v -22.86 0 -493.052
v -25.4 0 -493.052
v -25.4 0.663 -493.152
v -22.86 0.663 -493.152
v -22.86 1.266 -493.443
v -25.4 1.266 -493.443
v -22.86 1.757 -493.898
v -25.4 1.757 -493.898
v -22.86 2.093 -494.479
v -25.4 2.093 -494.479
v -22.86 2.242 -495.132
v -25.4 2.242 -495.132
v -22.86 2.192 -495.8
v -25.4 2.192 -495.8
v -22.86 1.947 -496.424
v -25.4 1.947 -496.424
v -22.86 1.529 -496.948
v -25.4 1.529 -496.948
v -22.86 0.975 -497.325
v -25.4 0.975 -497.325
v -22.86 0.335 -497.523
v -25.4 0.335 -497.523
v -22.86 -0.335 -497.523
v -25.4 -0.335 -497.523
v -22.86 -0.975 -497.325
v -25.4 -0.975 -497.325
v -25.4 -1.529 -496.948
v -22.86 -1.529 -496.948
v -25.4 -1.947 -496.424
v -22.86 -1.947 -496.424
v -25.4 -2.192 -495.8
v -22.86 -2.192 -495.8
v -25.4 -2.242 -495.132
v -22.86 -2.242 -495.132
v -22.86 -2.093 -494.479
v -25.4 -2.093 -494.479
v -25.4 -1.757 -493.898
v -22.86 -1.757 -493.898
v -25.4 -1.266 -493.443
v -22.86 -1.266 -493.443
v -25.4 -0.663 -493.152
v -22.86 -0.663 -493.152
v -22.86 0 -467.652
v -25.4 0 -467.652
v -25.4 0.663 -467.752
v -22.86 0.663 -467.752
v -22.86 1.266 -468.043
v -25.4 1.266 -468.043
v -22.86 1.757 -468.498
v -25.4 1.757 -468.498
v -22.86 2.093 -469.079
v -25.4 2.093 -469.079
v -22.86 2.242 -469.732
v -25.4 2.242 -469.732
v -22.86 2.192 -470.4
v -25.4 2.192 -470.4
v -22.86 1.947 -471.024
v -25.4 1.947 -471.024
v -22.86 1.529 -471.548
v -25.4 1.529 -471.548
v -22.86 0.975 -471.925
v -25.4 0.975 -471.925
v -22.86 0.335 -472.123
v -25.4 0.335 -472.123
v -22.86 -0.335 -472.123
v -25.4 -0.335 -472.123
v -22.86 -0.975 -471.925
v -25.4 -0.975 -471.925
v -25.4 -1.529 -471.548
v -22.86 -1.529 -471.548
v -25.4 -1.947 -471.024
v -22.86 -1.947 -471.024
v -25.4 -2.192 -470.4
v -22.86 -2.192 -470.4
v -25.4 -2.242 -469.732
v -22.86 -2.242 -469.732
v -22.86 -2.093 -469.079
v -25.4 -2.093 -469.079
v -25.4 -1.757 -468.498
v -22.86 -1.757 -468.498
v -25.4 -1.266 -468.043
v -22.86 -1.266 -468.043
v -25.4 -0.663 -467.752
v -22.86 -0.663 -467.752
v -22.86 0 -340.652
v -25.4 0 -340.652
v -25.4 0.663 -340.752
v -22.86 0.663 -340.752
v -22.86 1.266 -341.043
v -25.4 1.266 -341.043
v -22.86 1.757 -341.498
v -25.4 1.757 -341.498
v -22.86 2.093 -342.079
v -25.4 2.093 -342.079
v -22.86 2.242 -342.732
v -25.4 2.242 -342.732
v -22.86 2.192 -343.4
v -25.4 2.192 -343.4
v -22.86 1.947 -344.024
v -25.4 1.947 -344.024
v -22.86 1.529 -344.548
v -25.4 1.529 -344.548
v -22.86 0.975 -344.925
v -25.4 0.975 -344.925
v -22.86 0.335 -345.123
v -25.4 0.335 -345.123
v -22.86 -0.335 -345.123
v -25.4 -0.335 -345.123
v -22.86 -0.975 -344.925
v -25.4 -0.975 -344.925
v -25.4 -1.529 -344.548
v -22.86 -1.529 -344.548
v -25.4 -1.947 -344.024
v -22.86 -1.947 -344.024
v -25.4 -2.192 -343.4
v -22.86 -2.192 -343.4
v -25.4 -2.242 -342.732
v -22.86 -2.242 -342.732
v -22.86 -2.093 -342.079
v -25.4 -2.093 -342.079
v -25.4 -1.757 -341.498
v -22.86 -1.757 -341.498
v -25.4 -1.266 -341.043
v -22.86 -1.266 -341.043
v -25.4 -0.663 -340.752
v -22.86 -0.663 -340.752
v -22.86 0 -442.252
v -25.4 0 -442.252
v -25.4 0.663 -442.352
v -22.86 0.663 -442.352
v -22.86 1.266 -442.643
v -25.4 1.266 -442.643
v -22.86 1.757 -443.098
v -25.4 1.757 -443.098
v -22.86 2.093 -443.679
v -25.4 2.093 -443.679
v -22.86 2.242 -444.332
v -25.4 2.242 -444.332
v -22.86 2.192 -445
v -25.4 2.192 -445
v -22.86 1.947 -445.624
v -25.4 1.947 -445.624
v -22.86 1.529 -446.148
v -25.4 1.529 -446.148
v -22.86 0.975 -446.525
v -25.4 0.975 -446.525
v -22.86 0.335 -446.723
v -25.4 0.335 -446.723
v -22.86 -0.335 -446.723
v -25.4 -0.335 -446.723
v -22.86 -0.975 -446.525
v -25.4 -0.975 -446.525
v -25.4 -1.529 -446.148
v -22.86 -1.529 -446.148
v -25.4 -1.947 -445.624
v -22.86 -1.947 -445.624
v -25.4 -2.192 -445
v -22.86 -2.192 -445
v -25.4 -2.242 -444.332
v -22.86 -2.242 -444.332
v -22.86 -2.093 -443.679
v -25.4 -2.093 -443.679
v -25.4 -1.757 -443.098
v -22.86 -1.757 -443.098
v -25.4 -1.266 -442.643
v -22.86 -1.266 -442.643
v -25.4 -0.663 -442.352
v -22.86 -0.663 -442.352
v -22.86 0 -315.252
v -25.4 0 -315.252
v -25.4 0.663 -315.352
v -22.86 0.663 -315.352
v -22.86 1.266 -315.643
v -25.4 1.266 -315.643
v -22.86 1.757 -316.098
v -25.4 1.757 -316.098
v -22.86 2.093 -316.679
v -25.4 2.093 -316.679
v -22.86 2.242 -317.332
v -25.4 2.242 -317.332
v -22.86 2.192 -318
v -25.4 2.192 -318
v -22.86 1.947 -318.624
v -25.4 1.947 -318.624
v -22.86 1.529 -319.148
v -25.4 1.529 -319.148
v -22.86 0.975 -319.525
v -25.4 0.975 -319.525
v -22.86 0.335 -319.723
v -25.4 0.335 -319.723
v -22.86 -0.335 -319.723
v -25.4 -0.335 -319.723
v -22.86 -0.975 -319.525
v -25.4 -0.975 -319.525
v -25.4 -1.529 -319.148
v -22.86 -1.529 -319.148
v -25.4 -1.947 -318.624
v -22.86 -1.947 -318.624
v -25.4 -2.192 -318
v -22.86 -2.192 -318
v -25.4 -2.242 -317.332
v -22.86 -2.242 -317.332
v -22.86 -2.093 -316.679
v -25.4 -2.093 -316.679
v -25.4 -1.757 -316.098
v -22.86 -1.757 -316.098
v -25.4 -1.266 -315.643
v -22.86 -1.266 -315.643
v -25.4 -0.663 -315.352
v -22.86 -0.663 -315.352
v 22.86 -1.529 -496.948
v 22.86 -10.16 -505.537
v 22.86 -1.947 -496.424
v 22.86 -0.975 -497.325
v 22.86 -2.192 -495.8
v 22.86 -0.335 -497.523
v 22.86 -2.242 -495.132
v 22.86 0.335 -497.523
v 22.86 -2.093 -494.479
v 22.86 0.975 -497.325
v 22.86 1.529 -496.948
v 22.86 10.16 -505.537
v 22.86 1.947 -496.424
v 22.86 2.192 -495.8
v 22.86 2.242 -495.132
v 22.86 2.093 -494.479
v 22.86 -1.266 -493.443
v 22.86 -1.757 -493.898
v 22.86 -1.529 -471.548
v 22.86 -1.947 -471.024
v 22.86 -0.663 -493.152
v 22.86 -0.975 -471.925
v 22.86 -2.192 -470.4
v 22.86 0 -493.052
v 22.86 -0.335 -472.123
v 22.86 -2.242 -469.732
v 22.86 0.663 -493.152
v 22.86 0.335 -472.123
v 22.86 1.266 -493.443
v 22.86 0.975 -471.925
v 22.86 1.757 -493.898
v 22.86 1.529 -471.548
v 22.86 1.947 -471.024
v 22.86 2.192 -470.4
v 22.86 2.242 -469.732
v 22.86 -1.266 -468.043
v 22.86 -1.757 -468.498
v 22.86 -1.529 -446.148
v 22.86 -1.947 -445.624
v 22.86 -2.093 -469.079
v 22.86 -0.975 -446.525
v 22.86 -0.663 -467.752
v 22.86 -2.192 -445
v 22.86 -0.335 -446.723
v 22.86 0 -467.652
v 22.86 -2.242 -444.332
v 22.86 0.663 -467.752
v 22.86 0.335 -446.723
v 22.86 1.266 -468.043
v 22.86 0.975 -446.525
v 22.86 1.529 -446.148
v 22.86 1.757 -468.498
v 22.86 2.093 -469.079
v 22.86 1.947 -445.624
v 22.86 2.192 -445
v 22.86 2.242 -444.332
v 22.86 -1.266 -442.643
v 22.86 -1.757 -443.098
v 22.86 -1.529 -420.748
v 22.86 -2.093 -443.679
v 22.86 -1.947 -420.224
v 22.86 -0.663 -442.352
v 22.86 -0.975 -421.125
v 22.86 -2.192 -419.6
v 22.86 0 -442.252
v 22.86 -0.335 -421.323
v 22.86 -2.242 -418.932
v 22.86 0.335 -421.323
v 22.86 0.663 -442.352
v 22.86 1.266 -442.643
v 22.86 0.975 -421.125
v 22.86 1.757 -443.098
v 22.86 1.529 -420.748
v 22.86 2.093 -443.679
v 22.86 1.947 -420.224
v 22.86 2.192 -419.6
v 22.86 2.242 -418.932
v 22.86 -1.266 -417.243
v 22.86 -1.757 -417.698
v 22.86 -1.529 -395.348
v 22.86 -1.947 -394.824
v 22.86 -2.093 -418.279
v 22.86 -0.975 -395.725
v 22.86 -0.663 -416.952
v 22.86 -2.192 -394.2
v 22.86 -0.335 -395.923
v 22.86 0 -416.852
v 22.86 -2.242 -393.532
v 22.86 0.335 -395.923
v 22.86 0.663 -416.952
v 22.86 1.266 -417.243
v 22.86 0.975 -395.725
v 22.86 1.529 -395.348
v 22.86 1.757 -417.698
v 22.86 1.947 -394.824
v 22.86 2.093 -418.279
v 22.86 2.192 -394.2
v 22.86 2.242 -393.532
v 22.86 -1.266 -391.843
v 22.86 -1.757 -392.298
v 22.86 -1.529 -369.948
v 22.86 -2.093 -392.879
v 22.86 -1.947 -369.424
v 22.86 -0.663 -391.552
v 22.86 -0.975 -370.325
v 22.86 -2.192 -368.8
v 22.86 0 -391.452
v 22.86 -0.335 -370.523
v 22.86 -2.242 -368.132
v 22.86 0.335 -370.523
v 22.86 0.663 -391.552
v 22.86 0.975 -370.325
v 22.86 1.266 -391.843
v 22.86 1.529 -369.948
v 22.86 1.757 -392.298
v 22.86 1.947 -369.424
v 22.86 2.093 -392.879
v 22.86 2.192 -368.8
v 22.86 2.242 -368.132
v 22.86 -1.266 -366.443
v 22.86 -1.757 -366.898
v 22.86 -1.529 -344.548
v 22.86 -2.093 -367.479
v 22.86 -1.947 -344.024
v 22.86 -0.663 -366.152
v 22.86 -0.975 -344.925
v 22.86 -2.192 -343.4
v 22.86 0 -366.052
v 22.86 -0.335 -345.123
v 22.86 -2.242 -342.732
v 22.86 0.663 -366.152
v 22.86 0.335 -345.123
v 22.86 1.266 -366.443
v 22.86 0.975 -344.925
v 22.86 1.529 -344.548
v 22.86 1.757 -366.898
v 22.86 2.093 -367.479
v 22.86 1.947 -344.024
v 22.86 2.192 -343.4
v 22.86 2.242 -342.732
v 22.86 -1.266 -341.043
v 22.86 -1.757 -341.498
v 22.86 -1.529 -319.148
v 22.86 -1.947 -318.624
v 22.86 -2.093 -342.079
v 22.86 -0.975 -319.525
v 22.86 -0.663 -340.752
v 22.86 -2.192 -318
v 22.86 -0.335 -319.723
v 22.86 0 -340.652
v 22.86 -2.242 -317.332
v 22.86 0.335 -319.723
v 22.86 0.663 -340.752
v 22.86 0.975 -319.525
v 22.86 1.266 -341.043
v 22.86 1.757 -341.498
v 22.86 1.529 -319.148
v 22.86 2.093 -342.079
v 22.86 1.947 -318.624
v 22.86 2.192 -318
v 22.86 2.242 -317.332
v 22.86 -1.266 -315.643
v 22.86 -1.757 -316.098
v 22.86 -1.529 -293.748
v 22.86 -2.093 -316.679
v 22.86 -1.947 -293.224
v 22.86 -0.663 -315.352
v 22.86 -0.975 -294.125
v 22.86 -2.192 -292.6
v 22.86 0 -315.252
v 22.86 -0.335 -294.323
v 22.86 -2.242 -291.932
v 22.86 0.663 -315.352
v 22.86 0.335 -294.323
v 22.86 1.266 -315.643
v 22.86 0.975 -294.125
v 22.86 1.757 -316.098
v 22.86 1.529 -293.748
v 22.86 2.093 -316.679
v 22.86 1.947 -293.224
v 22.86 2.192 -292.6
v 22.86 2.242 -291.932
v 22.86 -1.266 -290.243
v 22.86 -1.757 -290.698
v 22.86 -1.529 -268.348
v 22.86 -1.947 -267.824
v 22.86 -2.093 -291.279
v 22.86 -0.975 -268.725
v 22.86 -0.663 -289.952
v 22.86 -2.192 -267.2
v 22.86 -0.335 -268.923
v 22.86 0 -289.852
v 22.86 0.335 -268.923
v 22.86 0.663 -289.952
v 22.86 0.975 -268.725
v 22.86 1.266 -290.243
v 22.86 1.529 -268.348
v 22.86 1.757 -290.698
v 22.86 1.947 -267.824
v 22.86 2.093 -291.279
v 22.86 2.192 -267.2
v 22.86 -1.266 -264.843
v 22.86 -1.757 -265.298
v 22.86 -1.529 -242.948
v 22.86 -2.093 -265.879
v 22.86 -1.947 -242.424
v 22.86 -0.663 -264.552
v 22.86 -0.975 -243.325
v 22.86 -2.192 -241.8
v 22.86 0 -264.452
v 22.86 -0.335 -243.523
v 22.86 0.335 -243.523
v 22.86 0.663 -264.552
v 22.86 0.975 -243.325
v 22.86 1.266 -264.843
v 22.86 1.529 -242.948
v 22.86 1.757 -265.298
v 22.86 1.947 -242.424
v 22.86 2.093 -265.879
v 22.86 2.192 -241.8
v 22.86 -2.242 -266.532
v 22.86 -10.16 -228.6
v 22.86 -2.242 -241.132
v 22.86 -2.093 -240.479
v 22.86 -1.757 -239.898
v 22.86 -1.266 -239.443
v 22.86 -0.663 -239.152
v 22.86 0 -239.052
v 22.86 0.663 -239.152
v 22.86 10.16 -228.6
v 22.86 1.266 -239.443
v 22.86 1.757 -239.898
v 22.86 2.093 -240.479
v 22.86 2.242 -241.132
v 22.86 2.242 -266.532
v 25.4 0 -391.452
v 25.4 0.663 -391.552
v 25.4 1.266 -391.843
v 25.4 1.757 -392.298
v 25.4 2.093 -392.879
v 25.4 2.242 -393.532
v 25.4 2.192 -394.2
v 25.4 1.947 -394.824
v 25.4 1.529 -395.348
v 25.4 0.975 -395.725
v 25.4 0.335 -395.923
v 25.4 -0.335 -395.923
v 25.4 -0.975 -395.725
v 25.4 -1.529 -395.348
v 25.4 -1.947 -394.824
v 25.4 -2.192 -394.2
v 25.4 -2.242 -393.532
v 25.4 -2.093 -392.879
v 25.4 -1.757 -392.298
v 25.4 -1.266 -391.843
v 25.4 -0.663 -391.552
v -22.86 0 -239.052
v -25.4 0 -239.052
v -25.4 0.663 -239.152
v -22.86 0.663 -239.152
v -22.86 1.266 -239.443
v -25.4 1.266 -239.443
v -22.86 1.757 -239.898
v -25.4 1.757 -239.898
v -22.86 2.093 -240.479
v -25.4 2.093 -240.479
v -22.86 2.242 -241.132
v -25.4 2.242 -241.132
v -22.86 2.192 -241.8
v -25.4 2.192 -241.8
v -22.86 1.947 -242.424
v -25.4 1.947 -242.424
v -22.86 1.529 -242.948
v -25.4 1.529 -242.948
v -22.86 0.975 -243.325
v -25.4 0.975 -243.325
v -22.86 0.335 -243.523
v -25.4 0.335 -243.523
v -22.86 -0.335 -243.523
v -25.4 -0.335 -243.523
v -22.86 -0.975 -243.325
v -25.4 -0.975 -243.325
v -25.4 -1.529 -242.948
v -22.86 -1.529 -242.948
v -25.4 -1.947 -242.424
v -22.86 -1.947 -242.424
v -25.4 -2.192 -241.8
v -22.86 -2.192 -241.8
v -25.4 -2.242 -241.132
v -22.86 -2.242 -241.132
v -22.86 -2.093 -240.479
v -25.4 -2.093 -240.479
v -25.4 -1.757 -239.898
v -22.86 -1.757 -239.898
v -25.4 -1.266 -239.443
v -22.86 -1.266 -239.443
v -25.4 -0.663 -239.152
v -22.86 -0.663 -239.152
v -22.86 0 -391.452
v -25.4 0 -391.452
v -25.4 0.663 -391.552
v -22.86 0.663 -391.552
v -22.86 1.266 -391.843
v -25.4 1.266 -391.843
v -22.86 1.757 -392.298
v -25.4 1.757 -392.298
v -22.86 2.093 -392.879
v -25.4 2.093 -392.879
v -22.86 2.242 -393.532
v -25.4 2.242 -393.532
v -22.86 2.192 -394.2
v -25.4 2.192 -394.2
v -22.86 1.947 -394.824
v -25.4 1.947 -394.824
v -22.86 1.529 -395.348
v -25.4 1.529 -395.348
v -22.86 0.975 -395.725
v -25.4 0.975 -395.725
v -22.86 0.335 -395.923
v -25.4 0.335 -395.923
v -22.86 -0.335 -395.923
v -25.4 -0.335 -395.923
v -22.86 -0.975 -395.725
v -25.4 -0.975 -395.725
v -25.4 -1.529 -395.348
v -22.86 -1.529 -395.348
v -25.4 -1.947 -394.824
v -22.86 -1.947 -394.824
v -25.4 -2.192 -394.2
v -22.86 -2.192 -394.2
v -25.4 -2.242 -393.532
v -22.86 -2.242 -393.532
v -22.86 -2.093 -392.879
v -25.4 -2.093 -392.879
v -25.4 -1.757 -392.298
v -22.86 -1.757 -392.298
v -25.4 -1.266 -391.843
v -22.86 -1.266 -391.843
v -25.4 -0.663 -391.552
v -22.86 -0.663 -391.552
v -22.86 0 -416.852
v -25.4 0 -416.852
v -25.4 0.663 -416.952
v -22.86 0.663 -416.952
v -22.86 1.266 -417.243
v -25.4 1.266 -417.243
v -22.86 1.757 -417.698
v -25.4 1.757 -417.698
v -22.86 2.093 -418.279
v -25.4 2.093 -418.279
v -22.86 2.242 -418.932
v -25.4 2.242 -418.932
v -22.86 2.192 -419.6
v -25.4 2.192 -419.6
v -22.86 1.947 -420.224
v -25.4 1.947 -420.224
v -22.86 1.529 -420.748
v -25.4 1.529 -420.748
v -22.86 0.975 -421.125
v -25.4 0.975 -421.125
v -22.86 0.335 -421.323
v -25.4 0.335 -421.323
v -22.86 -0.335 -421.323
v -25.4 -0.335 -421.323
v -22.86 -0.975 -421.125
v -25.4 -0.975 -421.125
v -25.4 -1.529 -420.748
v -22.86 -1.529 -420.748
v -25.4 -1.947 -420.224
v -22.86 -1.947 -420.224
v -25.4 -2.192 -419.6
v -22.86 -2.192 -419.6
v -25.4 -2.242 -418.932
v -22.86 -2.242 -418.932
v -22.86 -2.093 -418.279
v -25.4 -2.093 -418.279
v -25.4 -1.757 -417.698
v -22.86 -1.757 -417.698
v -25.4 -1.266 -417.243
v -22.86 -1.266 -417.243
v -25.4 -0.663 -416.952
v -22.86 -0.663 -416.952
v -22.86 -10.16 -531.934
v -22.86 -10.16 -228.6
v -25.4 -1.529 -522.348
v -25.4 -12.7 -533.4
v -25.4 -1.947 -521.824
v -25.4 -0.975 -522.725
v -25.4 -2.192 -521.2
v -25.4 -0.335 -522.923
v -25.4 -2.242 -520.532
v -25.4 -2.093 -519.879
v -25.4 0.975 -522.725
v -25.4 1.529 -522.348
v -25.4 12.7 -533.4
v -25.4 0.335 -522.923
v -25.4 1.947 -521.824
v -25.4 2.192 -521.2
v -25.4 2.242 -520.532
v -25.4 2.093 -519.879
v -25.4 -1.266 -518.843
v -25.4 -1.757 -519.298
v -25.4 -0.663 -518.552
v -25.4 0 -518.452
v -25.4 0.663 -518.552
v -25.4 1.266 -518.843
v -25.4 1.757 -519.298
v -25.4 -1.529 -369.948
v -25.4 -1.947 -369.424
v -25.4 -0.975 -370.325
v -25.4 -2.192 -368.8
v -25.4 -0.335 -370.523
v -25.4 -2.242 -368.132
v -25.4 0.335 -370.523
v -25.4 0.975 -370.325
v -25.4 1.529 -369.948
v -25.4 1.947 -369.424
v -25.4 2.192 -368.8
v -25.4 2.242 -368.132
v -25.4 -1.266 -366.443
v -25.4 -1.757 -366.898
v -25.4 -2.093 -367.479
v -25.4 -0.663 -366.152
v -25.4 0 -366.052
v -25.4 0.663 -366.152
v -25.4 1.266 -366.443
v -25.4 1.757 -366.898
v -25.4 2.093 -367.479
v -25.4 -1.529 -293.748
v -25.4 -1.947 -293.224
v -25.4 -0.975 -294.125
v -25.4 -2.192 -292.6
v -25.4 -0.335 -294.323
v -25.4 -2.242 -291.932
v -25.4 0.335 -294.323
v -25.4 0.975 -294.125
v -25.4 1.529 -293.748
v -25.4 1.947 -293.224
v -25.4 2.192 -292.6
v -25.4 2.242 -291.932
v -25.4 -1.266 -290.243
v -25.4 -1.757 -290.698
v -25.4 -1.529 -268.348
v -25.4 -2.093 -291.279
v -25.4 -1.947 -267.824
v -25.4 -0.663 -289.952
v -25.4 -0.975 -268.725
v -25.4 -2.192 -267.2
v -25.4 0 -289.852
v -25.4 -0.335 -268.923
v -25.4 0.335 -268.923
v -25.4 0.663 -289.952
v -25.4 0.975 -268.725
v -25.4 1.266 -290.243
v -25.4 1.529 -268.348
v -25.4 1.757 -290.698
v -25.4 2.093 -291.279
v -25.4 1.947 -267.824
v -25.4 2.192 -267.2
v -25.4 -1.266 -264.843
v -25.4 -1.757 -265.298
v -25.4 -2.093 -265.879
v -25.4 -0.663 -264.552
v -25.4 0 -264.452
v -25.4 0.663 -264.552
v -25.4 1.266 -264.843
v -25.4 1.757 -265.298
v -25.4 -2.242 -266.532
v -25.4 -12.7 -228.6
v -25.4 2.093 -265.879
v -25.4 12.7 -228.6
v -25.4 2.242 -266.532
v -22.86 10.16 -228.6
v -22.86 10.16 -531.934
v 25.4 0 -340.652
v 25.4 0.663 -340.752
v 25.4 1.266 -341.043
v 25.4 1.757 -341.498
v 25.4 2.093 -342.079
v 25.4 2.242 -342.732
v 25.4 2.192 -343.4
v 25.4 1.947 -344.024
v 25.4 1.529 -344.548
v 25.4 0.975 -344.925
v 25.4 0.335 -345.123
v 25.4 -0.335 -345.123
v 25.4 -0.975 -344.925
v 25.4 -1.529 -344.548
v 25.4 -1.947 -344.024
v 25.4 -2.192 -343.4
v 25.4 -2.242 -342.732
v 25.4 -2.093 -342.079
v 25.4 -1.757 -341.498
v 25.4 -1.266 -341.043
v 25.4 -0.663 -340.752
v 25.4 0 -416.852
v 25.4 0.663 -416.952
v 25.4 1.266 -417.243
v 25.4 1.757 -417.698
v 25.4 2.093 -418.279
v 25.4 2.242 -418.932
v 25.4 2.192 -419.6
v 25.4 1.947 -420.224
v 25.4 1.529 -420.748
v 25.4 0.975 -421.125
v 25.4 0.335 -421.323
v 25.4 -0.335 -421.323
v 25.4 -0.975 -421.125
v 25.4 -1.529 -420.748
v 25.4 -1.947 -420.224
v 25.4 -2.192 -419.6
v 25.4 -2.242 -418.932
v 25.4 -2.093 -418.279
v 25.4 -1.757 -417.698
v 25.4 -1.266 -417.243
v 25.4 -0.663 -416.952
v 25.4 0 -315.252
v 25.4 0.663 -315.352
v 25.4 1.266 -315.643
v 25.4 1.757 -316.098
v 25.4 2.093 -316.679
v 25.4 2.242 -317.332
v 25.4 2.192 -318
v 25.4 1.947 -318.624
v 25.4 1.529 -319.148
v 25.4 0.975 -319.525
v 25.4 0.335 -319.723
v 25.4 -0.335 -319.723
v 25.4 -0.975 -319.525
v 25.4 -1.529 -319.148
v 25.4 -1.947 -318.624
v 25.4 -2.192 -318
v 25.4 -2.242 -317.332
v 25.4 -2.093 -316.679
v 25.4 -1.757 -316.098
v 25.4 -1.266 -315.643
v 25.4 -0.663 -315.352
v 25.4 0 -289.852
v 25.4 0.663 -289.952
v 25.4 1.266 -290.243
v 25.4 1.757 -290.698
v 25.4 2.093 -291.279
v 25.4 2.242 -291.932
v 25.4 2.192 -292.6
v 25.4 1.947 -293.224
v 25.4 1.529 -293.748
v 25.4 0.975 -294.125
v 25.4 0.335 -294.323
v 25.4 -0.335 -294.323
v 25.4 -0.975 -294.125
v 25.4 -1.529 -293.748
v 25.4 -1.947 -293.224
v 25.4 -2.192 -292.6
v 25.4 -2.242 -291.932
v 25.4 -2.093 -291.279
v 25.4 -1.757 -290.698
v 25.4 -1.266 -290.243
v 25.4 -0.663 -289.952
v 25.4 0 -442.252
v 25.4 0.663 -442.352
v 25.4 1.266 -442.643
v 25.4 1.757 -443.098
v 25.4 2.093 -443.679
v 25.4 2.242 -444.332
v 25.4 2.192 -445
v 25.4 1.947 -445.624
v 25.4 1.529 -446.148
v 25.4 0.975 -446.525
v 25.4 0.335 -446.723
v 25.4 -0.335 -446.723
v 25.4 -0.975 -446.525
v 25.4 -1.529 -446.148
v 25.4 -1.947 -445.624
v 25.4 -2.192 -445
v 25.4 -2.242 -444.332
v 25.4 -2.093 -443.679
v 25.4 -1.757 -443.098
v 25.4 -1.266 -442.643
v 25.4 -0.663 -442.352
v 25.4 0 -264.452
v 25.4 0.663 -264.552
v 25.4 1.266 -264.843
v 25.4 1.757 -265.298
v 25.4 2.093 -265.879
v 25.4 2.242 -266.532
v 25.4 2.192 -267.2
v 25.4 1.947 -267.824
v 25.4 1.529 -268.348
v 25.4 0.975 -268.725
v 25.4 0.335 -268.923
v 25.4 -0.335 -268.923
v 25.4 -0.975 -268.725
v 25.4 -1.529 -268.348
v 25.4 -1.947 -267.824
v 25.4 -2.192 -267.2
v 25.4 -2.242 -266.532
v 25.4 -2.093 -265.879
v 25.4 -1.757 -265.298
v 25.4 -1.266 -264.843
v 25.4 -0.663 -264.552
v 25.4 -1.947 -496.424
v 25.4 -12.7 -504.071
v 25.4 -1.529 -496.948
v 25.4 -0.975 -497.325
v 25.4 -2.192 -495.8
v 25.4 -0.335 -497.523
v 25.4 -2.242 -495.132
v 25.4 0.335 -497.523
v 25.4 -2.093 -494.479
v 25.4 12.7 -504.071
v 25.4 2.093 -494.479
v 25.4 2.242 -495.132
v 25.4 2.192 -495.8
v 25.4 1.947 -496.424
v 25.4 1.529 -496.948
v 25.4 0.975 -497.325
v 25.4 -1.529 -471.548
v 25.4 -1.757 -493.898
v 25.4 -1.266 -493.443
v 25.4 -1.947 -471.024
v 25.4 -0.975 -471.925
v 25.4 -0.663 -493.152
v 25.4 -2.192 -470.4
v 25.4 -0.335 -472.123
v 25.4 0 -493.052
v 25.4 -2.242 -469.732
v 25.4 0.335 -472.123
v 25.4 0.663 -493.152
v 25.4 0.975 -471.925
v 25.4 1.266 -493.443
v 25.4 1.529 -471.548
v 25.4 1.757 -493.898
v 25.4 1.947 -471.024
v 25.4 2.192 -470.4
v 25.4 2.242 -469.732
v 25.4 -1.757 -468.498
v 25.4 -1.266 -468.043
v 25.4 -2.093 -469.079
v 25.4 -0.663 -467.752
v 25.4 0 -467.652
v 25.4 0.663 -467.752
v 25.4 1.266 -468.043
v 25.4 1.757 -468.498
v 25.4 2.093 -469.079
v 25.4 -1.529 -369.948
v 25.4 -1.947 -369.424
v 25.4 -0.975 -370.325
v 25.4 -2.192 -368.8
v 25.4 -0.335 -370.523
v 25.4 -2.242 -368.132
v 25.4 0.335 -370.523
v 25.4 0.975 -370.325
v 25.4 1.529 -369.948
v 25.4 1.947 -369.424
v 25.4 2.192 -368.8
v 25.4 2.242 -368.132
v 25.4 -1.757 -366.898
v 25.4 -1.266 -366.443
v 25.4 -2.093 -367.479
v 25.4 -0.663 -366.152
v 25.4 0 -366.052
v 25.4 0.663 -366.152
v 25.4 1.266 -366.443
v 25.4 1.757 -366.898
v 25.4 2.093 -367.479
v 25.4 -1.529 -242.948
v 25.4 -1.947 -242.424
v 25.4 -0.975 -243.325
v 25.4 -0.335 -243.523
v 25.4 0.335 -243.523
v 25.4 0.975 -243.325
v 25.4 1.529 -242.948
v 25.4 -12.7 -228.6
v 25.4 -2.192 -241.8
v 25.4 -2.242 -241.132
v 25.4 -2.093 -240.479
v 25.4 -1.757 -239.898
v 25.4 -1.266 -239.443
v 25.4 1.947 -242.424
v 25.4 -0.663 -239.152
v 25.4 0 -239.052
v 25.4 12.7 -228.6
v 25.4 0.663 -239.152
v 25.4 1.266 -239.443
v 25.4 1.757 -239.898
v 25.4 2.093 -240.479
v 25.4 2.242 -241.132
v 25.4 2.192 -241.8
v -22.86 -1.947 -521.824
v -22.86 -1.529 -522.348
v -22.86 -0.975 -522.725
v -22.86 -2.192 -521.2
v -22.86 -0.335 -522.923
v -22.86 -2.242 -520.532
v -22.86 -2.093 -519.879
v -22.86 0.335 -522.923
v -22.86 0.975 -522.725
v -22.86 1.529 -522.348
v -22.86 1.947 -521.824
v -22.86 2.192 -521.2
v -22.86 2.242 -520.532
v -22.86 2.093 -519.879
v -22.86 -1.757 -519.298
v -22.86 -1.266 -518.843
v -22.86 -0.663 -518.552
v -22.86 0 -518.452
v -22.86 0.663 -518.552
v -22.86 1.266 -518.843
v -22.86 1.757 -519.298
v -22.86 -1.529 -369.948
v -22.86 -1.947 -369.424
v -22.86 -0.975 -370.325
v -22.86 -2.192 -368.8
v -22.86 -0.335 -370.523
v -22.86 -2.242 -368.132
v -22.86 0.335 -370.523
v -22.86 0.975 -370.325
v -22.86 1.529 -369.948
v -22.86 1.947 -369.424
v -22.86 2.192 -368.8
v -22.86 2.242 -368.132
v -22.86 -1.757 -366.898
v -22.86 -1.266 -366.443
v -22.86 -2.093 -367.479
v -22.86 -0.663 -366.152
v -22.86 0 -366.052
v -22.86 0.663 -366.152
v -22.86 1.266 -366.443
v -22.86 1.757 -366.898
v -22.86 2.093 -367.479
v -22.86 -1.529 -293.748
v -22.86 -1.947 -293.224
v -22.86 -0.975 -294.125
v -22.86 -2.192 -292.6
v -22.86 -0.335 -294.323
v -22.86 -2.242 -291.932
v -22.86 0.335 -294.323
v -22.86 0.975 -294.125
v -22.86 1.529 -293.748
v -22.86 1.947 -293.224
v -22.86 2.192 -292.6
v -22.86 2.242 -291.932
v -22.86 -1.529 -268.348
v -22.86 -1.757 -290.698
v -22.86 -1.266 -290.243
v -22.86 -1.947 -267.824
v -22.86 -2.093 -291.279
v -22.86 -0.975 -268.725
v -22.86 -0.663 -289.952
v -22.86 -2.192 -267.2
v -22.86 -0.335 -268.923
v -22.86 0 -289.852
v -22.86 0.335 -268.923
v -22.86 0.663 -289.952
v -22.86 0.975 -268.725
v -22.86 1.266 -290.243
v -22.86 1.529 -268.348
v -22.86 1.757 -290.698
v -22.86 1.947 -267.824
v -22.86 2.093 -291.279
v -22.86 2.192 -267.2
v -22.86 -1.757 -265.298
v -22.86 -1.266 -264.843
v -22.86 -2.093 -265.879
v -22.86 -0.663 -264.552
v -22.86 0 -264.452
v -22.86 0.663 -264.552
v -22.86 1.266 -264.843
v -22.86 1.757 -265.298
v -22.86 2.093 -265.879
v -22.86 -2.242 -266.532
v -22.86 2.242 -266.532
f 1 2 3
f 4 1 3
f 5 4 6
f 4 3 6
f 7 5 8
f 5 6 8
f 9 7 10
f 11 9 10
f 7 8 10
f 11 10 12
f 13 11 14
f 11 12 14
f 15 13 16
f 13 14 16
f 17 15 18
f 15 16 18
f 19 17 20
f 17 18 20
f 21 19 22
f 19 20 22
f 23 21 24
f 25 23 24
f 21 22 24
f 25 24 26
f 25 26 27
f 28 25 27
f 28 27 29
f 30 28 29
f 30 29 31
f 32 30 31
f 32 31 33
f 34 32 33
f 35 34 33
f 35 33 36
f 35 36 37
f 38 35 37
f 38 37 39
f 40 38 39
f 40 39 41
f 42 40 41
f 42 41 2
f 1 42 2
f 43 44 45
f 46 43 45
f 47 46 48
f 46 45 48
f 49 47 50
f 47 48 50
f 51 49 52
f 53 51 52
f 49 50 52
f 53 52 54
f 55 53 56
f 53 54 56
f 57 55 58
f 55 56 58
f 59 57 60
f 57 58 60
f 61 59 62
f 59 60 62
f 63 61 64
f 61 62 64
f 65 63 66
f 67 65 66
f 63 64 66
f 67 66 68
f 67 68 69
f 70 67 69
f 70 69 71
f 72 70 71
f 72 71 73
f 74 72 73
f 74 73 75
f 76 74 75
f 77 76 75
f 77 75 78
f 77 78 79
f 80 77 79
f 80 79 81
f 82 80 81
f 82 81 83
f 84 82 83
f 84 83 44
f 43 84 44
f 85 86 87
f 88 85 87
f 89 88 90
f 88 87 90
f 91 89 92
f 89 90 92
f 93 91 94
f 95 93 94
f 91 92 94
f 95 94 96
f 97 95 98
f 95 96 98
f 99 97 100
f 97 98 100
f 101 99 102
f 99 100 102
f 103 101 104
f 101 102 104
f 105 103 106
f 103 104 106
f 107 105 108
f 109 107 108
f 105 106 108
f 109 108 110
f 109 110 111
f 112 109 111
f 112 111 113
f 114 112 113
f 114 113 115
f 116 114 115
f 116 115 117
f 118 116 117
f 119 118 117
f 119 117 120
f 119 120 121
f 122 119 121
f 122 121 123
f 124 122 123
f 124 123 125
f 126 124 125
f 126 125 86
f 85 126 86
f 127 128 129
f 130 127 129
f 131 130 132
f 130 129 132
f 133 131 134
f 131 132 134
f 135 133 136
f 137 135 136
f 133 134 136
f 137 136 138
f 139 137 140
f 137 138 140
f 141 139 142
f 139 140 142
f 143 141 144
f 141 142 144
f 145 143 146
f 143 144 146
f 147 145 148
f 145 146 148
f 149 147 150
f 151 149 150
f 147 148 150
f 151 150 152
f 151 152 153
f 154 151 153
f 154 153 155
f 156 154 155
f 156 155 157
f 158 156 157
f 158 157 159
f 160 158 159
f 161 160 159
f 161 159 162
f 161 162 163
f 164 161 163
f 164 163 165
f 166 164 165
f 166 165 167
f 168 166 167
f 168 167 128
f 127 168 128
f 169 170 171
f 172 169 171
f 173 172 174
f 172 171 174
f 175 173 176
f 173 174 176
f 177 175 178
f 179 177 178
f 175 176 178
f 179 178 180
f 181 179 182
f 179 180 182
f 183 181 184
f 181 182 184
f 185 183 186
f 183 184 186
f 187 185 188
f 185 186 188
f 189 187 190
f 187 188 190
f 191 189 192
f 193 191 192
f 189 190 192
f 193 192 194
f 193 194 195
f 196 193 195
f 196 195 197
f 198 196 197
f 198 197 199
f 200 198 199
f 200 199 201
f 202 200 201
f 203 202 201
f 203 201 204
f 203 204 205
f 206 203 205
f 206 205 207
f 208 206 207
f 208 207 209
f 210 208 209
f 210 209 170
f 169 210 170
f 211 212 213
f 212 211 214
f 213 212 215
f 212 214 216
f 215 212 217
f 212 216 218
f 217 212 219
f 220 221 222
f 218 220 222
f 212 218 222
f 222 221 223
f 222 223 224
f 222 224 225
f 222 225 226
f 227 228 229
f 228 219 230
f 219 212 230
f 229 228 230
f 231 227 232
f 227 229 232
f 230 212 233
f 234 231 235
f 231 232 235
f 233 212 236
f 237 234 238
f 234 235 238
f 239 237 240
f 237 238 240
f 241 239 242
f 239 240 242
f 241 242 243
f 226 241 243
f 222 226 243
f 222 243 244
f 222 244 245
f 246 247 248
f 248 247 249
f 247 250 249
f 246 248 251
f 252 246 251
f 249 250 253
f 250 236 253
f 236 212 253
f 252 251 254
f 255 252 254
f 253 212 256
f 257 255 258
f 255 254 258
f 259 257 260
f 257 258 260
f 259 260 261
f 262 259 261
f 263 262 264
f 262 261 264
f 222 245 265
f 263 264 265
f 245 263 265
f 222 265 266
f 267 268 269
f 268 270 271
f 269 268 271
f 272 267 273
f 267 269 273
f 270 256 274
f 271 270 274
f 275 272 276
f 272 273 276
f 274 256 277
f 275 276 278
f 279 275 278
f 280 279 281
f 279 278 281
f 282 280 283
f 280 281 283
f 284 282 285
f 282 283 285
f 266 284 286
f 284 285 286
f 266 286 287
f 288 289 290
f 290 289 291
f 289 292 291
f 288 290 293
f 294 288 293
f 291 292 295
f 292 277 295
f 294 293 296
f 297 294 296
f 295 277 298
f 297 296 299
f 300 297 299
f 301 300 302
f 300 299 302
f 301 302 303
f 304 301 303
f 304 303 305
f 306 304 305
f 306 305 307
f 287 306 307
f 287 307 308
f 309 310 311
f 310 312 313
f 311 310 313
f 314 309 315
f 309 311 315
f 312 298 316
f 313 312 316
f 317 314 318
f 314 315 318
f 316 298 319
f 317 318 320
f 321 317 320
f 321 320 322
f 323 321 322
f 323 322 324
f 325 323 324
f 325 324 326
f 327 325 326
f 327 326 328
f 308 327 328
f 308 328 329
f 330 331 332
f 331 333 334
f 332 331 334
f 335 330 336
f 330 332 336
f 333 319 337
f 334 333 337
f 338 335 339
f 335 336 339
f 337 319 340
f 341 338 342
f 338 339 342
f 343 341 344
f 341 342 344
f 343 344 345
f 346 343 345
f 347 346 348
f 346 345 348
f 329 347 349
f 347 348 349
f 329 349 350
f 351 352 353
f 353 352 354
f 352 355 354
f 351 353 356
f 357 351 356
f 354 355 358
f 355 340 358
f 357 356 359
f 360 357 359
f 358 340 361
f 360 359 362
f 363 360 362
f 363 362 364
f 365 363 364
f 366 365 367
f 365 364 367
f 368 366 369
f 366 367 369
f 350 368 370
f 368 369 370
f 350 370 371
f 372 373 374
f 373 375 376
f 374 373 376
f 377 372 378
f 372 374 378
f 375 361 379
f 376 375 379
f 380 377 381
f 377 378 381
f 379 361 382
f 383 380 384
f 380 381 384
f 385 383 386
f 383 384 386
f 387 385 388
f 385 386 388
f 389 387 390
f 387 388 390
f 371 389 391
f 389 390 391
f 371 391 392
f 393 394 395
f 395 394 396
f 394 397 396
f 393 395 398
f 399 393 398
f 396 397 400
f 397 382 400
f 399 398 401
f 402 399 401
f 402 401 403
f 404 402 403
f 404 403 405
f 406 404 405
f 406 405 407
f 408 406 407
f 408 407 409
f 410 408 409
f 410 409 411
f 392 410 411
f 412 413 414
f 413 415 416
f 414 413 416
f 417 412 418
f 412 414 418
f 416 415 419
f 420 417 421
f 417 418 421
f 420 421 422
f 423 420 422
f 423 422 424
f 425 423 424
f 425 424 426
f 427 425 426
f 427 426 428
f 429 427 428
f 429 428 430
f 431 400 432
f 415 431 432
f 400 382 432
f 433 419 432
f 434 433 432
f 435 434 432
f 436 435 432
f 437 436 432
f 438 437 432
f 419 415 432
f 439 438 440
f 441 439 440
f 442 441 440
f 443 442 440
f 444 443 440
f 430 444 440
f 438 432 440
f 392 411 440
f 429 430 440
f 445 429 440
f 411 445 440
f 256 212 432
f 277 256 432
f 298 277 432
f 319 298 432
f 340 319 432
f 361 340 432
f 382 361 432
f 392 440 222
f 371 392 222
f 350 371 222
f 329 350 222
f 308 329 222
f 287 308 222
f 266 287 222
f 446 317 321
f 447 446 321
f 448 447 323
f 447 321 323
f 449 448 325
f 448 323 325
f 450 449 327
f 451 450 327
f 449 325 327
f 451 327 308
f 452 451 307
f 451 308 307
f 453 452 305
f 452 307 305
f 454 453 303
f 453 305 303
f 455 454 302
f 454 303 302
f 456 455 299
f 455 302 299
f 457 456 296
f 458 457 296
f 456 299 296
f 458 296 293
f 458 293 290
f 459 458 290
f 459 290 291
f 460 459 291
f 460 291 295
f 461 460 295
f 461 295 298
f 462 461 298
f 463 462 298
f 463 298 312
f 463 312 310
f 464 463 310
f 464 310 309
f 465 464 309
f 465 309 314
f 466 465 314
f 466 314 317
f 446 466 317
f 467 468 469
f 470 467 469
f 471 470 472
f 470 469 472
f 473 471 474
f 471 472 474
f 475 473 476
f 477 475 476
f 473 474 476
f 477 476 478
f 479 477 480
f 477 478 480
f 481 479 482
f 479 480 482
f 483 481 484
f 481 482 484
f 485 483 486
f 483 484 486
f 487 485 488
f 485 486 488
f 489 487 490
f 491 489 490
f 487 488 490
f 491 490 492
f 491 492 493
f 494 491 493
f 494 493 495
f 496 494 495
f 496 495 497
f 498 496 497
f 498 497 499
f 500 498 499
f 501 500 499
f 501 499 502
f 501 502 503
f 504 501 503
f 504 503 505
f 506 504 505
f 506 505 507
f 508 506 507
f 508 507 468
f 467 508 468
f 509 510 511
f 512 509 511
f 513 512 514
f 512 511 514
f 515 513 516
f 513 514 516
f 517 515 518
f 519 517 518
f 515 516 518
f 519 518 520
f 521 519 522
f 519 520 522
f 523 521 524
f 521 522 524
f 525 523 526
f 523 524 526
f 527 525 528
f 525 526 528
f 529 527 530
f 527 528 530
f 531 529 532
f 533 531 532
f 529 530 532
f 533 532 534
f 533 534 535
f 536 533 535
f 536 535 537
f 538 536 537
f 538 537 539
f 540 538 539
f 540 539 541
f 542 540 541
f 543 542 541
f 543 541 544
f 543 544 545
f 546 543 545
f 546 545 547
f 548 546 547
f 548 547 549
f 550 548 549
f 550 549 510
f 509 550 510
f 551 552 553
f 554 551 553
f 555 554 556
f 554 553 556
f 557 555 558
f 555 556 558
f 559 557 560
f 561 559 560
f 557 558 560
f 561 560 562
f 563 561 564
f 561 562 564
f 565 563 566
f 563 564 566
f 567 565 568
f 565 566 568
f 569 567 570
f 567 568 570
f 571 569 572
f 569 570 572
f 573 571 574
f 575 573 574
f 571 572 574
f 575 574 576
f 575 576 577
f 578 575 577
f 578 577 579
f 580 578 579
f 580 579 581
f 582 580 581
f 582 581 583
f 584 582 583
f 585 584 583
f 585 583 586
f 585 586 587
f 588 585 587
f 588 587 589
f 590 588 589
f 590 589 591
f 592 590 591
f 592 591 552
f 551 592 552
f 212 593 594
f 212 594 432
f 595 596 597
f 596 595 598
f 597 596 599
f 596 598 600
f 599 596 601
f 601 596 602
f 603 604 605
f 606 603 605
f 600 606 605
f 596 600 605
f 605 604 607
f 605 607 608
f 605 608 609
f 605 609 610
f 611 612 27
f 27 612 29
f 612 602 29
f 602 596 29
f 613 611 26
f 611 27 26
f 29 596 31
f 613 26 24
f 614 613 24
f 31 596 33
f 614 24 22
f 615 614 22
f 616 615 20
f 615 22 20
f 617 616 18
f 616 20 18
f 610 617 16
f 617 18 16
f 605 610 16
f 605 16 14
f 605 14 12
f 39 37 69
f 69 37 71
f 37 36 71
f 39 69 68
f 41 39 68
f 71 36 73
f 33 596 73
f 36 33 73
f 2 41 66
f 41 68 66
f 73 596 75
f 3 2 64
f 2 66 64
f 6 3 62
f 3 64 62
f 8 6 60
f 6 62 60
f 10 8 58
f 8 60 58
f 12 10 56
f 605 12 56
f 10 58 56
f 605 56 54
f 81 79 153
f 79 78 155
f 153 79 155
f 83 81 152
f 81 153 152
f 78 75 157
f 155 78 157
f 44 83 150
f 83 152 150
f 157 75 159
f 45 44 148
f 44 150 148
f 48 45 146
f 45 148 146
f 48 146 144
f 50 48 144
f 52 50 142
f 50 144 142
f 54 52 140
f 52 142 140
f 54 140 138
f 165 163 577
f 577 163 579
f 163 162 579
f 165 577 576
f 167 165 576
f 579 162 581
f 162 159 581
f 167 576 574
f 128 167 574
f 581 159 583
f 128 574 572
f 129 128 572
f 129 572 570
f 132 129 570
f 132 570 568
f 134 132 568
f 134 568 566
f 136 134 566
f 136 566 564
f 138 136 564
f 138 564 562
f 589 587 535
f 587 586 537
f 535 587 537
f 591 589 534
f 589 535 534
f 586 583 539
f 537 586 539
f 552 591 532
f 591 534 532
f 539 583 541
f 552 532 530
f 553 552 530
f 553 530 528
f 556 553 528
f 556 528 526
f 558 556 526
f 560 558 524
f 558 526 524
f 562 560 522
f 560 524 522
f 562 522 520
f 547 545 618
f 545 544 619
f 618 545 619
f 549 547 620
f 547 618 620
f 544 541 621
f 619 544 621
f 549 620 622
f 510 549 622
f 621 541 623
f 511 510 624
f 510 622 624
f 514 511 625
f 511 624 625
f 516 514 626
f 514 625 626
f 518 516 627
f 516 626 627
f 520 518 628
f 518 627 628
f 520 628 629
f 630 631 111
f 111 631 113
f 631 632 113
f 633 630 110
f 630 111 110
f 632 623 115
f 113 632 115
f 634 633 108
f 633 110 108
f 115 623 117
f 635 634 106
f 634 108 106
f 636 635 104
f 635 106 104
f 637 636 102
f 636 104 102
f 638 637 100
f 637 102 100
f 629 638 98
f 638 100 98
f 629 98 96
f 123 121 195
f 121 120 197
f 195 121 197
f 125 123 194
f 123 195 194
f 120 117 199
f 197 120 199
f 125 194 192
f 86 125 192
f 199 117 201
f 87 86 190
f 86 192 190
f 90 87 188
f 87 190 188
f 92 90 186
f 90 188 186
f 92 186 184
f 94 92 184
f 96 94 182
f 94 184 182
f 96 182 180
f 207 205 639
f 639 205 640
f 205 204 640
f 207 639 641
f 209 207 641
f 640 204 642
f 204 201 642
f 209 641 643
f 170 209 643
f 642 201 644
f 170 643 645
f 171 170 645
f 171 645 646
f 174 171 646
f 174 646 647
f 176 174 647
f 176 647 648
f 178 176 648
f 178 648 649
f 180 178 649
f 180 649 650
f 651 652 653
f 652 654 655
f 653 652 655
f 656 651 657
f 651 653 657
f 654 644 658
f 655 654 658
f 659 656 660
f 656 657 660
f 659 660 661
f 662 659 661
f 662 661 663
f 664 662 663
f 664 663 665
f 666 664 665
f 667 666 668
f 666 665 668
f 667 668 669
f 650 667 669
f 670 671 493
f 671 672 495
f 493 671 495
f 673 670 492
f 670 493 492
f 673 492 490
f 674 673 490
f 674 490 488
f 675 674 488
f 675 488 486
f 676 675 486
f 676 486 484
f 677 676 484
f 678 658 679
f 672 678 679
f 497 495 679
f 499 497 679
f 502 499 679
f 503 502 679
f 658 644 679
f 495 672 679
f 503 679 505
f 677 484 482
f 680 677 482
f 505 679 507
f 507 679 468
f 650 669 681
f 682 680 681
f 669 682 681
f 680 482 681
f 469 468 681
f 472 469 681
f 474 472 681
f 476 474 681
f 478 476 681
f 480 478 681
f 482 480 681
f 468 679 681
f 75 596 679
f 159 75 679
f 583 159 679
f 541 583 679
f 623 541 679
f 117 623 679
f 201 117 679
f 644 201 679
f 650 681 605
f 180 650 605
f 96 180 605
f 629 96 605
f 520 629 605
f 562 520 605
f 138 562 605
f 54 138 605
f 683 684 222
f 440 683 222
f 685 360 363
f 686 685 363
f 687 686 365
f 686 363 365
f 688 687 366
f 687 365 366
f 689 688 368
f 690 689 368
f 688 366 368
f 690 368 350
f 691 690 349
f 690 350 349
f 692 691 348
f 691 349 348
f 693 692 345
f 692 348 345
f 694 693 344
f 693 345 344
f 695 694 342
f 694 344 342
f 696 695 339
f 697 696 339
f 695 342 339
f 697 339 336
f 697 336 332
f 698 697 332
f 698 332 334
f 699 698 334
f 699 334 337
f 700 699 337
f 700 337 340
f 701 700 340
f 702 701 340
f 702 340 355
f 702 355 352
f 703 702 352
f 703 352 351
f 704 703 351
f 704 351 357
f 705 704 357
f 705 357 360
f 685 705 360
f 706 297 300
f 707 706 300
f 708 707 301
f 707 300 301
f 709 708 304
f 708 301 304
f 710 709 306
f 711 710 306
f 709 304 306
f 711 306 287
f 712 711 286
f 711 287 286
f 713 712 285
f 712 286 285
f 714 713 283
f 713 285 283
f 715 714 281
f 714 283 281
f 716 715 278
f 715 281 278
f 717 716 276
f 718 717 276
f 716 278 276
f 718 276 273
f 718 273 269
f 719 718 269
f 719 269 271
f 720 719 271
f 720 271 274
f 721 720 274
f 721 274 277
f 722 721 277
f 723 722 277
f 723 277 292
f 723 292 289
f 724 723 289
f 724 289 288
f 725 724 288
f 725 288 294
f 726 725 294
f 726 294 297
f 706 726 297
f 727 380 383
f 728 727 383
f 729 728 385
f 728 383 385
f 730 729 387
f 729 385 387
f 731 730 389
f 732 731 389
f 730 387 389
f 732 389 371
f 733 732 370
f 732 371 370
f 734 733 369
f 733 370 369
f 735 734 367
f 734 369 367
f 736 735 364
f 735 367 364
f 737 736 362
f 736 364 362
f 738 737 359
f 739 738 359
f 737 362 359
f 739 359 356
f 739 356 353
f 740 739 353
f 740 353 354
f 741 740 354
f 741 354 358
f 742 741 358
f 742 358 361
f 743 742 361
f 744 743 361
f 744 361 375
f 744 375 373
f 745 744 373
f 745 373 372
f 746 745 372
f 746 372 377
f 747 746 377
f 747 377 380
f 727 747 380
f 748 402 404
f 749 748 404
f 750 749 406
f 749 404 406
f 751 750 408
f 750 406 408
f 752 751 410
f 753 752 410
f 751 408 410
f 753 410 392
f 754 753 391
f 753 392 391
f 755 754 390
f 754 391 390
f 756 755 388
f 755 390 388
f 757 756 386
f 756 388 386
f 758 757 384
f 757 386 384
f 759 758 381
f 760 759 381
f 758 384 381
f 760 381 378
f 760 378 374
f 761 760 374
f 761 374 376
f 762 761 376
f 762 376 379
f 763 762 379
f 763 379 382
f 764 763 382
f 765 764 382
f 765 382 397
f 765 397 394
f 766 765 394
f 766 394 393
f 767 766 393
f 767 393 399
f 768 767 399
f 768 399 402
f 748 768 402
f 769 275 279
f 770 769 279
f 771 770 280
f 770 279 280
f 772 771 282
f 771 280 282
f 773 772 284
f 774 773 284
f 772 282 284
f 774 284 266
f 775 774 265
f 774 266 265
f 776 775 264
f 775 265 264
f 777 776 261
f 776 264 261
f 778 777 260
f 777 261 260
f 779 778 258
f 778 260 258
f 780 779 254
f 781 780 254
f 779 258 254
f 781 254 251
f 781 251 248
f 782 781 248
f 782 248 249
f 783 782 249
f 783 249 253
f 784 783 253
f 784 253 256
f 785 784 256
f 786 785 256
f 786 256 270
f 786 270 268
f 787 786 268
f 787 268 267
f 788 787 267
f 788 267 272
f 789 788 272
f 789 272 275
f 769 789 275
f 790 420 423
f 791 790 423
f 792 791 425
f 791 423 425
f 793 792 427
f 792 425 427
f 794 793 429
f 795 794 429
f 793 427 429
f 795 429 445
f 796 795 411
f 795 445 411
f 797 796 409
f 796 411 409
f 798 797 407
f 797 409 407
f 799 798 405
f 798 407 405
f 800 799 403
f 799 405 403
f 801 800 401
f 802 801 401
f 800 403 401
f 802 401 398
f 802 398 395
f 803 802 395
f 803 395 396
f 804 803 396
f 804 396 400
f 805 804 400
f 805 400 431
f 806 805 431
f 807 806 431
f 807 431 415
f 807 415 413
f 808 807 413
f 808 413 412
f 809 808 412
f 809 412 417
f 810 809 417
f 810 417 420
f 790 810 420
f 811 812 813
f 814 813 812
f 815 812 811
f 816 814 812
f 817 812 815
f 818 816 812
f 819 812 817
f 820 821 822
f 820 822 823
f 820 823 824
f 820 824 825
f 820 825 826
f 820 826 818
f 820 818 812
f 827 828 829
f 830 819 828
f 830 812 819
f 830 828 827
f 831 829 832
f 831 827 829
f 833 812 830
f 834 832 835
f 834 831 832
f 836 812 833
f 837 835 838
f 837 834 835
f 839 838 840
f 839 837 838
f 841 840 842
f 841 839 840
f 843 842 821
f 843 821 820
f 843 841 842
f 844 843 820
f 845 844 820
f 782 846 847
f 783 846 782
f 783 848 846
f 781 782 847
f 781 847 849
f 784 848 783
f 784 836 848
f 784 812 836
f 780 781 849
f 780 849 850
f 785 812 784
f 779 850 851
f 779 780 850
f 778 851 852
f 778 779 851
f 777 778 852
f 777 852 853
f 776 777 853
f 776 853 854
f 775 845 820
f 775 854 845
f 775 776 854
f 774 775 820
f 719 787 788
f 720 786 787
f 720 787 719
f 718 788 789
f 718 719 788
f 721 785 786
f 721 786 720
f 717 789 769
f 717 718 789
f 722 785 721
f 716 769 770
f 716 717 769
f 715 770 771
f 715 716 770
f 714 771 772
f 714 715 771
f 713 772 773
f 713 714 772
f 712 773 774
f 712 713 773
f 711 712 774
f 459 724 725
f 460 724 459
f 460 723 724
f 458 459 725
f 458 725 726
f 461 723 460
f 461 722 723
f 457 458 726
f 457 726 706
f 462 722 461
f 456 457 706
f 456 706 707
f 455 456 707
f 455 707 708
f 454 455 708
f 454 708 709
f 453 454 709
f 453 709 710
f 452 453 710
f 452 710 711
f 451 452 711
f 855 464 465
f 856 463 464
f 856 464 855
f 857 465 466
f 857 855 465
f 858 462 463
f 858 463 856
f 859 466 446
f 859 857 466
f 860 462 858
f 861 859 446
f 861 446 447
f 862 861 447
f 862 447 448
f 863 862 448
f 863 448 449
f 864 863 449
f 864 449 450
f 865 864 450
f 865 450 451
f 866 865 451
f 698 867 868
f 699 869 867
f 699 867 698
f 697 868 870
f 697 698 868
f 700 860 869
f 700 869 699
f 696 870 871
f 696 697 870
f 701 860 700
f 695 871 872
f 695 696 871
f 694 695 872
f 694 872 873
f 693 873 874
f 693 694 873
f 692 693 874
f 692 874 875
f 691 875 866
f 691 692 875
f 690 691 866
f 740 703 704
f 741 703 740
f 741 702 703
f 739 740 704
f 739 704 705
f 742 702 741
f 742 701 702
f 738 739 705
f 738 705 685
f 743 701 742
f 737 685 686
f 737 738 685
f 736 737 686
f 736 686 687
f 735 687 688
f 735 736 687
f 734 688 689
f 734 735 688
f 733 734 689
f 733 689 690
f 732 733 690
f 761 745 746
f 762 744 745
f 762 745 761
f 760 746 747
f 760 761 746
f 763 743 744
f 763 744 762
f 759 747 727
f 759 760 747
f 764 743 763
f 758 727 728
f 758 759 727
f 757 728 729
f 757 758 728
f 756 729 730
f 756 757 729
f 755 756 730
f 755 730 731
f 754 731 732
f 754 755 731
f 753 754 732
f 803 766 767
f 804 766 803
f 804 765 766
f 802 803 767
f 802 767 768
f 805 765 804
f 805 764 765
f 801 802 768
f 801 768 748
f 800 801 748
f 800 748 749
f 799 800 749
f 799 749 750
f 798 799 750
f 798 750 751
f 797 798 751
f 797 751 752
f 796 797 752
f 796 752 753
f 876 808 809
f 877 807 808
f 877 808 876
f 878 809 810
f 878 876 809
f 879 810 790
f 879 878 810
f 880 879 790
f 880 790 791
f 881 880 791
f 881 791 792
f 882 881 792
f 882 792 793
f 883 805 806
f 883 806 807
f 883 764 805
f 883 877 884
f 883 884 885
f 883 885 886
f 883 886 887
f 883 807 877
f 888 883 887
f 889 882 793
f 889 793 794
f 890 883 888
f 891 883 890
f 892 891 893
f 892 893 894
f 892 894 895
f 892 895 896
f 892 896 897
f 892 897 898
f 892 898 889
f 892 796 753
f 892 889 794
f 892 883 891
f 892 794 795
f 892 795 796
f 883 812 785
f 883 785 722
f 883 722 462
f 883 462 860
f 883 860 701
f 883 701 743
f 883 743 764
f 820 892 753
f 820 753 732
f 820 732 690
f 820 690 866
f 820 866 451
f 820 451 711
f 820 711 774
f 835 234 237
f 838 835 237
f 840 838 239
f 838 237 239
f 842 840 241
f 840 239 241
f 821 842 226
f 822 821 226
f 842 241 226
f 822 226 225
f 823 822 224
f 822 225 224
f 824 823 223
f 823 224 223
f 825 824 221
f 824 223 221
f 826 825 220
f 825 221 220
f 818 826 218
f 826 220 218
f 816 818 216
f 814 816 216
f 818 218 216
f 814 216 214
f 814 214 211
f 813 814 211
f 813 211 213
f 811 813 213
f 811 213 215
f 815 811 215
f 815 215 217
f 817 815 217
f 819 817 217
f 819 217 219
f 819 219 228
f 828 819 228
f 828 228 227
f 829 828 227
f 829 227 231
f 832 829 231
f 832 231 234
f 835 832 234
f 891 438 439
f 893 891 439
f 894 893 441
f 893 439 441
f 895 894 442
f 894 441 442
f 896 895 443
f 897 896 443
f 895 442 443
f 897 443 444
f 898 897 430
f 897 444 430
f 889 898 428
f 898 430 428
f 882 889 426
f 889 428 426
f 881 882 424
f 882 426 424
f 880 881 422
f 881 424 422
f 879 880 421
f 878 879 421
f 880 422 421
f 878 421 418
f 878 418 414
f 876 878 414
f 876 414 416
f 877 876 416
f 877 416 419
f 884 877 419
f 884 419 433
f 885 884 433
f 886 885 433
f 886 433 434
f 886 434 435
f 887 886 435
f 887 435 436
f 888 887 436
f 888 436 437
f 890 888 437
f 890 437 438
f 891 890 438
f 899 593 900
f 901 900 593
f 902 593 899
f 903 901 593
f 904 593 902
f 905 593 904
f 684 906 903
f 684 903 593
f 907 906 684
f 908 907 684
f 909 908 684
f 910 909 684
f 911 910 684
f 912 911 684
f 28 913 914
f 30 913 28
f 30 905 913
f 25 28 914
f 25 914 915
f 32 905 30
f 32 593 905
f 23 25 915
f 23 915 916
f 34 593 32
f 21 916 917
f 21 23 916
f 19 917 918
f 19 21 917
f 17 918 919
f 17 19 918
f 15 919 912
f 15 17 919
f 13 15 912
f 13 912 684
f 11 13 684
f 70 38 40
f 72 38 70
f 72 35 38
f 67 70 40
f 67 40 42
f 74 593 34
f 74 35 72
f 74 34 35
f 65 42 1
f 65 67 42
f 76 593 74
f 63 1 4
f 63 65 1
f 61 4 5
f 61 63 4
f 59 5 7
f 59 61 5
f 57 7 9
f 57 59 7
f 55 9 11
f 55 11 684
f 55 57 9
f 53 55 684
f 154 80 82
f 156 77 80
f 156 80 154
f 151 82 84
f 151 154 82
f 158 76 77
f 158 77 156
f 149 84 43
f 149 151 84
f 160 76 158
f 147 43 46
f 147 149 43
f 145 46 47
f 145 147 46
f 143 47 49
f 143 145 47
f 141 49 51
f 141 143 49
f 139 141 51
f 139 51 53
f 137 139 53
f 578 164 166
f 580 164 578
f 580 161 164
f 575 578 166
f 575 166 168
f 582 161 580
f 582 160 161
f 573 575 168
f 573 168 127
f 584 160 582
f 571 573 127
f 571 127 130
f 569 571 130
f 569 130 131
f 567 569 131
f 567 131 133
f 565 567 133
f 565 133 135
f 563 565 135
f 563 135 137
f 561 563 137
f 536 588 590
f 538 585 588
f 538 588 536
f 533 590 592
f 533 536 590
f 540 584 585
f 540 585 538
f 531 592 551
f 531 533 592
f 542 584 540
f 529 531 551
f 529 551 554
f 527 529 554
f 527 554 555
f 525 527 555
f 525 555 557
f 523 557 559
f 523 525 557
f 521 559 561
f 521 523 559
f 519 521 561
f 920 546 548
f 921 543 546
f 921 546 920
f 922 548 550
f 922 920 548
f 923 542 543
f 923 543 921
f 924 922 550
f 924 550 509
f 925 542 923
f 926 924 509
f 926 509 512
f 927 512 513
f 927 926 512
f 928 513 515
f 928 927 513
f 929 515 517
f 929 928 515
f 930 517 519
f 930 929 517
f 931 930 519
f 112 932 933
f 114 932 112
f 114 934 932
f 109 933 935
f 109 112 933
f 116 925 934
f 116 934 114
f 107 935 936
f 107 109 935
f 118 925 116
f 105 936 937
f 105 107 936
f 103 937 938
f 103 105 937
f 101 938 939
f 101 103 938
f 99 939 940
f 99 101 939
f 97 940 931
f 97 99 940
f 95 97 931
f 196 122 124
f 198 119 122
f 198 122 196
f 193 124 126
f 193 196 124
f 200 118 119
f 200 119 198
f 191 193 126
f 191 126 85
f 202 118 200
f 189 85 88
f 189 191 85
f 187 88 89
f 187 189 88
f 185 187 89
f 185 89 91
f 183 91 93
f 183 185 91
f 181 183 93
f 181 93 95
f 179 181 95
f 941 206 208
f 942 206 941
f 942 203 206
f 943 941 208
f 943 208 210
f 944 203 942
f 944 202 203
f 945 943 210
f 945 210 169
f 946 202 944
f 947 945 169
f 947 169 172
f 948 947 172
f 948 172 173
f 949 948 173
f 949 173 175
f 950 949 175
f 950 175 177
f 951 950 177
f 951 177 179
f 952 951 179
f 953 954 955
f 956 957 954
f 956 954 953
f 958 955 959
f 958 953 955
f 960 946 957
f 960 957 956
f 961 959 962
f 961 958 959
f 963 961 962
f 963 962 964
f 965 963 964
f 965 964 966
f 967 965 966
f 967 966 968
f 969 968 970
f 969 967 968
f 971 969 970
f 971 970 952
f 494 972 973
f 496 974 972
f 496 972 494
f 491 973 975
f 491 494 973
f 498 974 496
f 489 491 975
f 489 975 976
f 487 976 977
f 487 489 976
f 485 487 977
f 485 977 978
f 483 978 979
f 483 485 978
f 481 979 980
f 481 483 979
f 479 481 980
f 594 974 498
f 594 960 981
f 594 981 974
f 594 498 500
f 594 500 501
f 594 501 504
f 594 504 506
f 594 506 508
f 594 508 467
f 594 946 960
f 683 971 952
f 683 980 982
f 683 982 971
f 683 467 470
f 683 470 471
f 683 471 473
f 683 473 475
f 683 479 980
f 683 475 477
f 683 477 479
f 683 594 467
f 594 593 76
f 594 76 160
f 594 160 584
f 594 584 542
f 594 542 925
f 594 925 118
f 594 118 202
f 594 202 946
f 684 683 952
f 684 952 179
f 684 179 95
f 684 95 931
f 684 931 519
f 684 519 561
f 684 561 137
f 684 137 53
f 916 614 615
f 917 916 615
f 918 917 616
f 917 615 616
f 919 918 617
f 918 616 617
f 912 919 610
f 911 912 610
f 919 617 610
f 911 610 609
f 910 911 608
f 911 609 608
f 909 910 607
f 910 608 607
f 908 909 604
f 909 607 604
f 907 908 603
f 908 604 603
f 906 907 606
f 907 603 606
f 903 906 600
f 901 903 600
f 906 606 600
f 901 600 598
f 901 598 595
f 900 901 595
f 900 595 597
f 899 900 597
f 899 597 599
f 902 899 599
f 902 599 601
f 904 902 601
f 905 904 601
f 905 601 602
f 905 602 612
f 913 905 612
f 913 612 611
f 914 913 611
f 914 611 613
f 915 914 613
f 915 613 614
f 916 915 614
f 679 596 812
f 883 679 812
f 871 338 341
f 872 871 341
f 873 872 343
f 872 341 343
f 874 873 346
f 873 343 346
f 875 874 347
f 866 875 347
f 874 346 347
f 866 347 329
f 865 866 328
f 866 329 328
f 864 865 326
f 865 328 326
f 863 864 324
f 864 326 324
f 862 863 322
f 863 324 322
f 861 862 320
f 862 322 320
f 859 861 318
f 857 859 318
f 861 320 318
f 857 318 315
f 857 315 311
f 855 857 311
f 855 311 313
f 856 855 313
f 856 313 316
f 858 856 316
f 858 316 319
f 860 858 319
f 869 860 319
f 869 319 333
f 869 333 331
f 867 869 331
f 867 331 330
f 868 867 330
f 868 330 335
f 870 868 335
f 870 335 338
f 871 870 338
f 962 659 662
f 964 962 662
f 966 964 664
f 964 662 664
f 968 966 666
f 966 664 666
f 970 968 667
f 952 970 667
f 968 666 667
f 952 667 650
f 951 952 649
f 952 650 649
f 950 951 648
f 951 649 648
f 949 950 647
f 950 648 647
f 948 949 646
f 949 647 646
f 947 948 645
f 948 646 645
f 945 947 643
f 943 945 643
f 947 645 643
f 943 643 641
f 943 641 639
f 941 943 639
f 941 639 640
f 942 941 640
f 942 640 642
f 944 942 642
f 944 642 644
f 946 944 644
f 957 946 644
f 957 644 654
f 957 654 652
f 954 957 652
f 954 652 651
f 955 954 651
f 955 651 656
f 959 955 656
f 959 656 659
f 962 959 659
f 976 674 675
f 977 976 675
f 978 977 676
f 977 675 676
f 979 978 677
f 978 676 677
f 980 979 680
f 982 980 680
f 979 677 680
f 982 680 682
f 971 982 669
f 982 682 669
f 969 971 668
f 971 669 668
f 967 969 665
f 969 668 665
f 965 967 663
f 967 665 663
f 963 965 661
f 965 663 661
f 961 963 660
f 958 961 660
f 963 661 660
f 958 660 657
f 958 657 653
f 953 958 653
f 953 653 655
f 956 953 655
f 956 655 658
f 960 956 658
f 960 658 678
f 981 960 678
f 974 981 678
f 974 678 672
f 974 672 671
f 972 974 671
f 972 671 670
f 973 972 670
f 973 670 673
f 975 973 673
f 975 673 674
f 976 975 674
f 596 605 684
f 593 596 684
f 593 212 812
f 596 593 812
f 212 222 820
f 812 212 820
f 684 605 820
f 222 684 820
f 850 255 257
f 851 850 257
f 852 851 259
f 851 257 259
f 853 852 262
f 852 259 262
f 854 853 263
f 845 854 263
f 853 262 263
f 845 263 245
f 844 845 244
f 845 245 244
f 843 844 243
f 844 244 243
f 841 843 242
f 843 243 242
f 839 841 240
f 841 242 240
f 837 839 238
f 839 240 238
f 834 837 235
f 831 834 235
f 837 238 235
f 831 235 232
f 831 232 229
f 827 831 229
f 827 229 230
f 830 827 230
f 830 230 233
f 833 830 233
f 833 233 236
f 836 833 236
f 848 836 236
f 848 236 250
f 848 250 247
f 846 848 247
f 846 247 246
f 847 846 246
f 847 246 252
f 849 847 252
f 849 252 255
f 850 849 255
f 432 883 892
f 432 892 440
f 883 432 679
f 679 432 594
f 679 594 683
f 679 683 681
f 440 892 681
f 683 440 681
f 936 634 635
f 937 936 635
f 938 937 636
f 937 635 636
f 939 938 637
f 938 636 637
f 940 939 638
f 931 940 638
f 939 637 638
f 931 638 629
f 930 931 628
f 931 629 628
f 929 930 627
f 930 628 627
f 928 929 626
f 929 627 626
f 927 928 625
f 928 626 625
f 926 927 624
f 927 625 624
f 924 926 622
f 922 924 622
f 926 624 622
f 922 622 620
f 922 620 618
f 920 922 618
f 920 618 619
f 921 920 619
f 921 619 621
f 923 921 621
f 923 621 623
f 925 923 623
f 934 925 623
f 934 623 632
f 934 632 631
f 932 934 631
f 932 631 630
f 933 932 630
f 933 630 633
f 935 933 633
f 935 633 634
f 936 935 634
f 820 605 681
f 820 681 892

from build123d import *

# Parameters (mm, degrees)
SKETCH1_W             = 50.8
SKETCH1_H             = 25.4
SKETCH1_W_2           = 45.72
SKETCH1_H_2           = 20.32
BOSS_EXTRUDE1_DEPTH   = 533.4
F_8_CLEARANCE_HOLE1_D = 4.4958
CUT_EXTRUDE2_DEPTH    = 76.962
CUT_EXTRUDE4_DEPTH    = 40.64


with BuildPart() as part:
    # Sketch1 → Boss-Extrude1 (new body)
    with BuildSketch(Plane.XY):
        Rectangle(SKETCH1_W, SKETCH1_H)
        Rectangle(SKETCH1_W_2, SKETCH1_H_2, mode=Mode.SUBTRACT)
    extrude(amount=-BOSS_EXTRUDE1_DEPTH)

    # #8 Clearance Hole1 (through all)
    with Locations(Plane(origin=(25.4, 0, 0), x_dir=(0, 0, -1), z_dir=(1, 0, 0))):
        with Locations((12.7, 0), (38.1, 0), (63.5, 0), (88.9, 0), (114.3, 0), (139.7, 0), (165.1, 0), (190.5, 0), (215.9, 0), (241.3, 0), (266.7, 0), (292.1, 0), (317.5, 0), (342.9, 0), (368.3, 0), (393.7, 0), (419.1, 0), (444.5, 0), (469.9, 0), (495.3, 0), (520.7, 0)):
            Hole(F_8_CLEARANCE_HOLE1_D / 2)

    # Sketch4 → Cut-Extrude2 (cut)
    with BuildSketch(Plane(origin=(0, 12.7, 0), x_dir=(1, 0, 0), z_dir=(0, 1, 0))):
        Polygon((-7.206301081, 228.6), (135.513081356, 228.6), (135.513081356, -17.641370014), (-94.056886123, -17.641370014), (-94.056886123, 228.6), align=None)
    extrude(amount=-CUT_EXTRUDE2_DEPTH, mode=Mode.SUBTRACT)

    # Sketch6 → Cut-Extrude4 (cut)
    with BuildSketch(Plane(origin=(0, 12.7, 0), x_dir=(1, 0, 0), z_dir=(0, 1, 0))):
        Polygon((-25.4, 533.4), (25.4, 504.070606325), (25.4, 533.4), align=None)
    extrude(amount=-CUT_EXTRUDE4_DEPTH, mode=Mode.SUBTRACT)


solid = part.part
